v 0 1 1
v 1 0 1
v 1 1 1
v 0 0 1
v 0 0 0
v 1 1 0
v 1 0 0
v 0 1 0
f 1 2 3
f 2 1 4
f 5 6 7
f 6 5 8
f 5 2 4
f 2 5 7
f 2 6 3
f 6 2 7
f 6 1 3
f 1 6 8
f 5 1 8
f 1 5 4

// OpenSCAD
// parameter

x = 0.1;
y = 0.05;


h = 0.8e-3;
w = 3e-3;

cube();
